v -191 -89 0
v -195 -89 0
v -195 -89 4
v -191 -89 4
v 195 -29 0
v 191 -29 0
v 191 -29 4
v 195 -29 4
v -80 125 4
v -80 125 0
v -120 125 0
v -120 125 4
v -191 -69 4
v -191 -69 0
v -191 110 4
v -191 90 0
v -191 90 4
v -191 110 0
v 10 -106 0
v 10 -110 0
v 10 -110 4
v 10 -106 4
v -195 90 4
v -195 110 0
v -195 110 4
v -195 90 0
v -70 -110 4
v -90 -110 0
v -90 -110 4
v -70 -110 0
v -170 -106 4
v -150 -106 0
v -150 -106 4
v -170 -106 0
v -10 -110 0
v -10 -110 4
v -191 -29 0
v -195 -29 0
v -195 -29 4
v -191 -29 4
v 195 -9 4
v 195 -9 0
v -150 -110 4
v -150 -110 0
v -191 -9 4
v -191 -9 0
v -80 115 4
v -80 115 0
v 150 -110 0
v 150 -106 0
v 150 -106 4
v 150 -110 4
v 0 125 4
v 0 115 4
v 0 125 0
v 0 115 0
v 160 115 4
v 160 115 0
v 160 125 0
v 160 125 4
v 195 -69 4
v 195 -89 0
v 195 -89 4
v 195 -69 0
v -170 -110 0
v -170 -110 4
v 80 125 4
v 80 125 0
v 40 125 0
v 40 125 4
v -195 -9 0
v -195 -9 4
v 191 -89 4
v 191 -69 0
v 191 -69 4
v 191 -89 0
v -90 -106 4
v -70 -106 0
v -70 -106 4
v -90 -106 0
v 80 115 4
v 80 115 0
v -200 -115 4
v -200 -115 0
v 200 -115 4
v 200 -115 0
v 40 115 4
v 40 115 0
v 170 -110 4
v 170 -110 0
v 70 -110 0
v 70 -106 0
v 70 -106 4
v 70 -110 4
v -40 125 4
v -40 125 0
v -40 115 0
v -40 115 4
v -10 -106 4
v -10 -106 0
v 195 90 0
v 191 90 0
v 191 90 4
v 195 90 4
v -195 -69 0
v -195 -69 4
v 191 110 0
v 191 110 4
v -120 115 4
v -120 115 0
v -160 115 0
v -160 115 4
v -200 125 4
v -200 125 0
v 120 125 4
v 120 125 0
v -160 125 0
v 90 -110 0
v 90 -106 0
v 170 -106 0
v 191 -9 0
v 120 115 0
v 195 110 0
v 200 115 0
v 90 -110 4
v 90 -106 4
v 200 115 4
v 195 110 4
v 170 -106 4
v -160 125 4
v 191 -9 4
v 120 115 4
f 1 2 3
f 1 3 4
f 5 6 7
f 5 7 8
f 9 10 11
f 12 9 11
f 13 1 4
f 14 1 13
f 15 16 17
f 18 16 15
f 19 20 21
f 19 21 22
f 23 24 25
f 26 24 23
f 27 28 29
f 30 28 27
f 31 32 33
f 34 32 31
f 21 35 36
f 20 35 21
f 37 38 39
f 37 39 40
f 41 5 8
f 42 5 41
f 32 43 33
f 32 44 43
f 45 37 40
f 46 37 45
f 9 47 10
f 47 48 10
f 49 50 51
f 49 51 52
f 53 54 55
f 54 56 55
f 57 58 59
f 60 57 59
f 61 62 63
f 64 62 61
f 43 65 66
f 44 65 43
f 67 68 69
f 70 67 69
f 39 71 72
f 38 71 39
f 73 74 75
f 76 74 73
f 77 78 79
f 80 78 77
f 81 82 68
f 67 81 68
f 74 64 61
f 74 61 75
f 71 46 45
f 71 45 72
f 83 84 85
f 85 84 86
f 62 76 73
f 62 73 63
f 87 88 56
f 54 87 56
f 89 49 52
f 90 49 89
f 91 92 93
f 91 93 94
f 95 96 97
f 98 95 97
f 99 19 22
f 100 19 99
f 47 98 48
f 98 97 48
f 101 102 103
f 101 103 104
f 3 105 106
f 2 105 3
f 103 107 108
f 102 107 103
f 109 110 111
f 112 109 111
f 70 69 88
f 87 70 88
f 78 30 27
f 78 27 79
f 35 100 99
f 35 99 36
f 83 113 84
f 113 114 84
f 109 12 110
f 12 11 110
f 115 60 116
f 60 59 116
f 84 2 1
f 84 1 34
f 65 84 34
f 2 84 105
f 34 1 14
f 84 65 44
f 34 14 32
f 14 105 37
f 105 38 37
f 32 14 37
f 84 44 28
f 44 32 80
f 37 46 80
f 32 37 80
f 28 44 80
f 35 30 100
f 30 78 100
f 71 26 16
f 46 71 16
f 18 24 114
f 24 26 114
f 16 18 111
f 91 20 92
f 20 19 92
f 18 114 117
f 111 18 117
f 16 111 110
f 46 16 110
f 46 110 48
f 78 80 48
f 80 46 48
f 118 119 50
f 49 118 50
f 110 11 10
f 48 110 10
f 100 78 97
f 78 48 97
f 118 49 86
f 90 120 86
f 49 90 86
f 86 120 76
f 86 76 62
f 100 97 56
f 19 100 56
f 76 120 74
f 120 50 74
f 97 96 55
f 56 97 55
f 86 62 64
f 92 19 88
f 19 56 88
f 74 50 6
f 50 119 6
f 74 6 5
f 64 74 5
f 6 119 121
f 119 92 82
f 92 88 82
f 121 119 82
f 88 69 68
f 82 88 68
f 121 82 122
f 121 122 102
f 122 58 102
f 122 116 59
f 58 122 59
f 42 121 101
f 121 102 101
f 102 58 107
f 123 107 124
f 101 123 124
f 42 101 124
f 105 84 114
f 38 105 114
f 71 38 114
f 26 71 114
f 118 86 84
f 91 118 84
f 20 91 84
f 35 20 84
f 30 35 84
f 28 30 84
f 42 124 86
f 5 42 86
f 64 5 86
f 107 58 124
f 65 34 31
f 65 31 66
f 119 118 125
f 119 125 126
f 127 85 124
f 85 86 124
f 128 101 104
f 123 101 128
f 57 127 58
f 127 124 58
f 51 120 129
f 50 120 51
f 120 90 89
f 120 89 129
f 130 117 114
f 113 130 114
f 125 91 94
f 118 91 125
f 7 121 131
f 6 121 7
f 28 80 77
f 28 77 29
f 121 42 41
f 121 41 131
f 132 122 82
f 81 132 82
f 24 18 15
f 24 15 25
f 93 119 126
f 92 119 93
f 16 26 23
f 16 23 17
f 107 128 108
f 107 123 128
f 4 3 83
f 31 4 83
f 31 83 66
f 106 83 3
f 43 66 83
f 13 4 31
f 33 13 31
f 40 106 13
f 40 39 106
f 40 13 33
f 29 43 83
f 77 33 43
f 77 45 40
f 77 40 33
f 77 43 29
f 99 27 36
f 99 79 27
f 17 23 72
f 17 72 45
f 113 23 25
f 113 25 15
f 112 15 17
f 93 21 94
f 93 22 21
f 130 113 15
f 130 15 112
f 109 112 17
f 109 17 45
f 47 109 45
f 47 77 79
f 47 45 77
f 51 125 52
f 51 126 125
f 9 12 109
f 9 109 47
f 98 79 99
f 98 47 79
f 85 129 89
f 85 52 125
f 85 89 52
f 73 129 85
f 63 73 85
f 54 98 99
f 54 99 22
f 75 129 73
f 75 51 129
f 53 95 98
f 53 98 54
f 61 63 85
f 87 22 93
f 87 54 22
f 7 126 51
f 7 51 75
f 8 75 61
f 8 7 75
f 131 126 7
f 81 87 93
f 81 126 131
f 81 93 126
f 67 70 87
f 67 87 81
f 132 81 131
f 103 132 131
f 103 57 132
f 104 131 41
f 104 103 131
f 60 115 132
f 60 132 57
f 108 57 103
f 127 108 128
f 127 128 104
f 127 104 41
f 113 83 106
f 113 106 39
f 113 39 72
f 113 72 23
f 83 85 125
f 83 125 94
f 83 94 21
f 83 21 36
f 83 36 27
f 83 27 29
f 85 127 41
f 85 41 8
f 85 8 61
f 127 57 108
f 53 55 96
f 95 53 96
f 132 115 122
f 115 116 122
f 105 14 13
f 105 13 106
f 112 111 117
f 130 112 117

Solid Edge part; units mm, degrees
sketch "Sketch1" plane through (0, 0, 0) normal (0, 0, 1) x (1, 0, 0)
  line L0 (-200, -115) -> (200, -115)
  line L1 (200, -115) -> (200, 115)
  line L2 (200, 115) -> (-200, 115)
  line L3 (-200, 115) -> (-200, -115)
  line L4 (-160, 115) -> (-160, 125)
  line L5 (-160, 125) -> (-200, 125)
  line L6 (-200, 125) -> (-200, 115)
  line L7 (-200, 115) -> (-160, 115)
  line L8 (-120, 115) -> (-80, 115)
  line L9 (-80, 115) -> (-80, 125)
  line L10 (-80, 125) -> (-120, 125)
  line L11 (-120, 125) -> (-120, 115)
  line L12 (-40, 115) -> (0, 115)
  line L13 (0, 115) -> (0, 125)
  line L14 (0, 125) -> (-40, 125)
  line L15 (-40, 125) -> (-40, 115)
  line L16 (40, 115) -> (80, 115)
  line L17 (80, 115) -> (80, 125)
  line L18 (80, 125) -> (40, 125)
  line L19 (40, 125) -> (40, 115)
  line L20 (120, 115) -> (160, 115)
  line L21 (160, 115) -> (160, 125)
  line L22 (160, 125) -> (120, 125)
  line L23 (120, 125) -> (120, 115)
  line L24 (-150, -106) -> (-170, -106)
  line L25 (-170, -106) -> (-170, -110)
  line L26 (-170, -110) -> (-150, -110)
  line L27 (-150, -110) -> (-150, -106)
  line L28 (-90, -110) -> (-70, -110)
  line L29 (-70, -110) -> (-70, -106)
  line L30 (-70, -106) -> (-90, -106)
  line L31 (-90, -106) -> (-90, -110)
  line L32 (-10, -110) -> (10, -110)
  line L33 (10, -110) -> (10, -106)
  line L34 (10, -106) -> (-10, -106)
  line L35 (-10, -106) -> (-10, -110)
  line L36 (70, -110) -> (90, -110)
  line L37 (90, -110) -> (90, -106)
  line L38 (90, -106) -> (70, -106)
  line L39 (70, -106) -> (70, -110)
  line L40 (150, -110) -> (170, -110)
  line L41 (170, -110) -> (170, -106)
  line L42 (170, -106) -> (150, -106)
  line L43 (150, -106) -> (150, -110)
  line L44 (-191, -89) -> (-191, -69)
  line L45 (-191, -69) -> (-195, -69)
  line L46 (-195, -69) -> (-195, -89)
  line L47 (-195, -89) -> (-191, -89)
  line L48 (-191, -29) -> (-191, -9)
  line L49 (-191, -9) -> (-195, -9)
  line L50 (-195, -9) -> (-195, -29)
  line L51 (-195, -29) -> (-191, -29)
  line L52 (-191, 90) -> (-191, 110)
  line L53 (-191, 110) -> (-195, 110)
  line L54 (-195, 110) -> (-195, 90)
  line L55 (-195, 90) -> (-191, 90)
  line L56 (191, -69) -> (191, -89)
  line L57 (191, -89) -> (195, -89)
  line L58 (195, -89) -> (195, -69)
  line L59 (195, -69) -> (191, -69)
  line L60 (195, -29) -> (195, -9)
  line L61 (195, -9) -> (191, -9)
  line L62 (191, -9) -> (191, -29)
  line L63 (191, -29) -> (195, -29)
  line L64 (191, 110) -> (191, 90)
  line L65 (191, 90) -> (195, 90)
  line L66 (195, 90) -> (195, 110)
  line L67 (195, 110) -> (191, 110)
  dimension "D1" = 20
  dimension "D2" = 20
  dimension "D3" = 20
  dimension "D4" = 4
  dimension "D5" = 4
  dimension "D6" = 20
  dimension "D7" = 20
  dimension "D8" = 4
  dimension "D9" = 4
  dimension "D10" = 4
  dimension "D11" = 30
  dimension "D12" = 60
  dimension "D13" = 60
  dimension "D14" = 30
  dimension "D15" = 60
  dimension "D16" = 60
  dimension "D17" = 5
  dimension "D18" = 5
  dimension "D19" = 5
  dimension "D20" = 5
  dimension "D21" = 5
  dimension "D22" = 40
  dimension "D23" = 10
  dimension "D24" = 40
  dimension "D25" = 40
  dimension "D26" = 10
  dimension "D27" = 40
  dimension "D28" = 40
  dimension "D29" = 10
  dimension "D30" = 40
  dimension "D31" = 40
  dimension "D32" = 10
  dimension "D33" = 40
  dimension "D34" = 40
  dimension "D35" = 10
  dimension "D36" = 40
  dimension "D37" = 230
  dimension "D38" = 20
  dimension "D39" = 4
  dimension "D40" = 5
  dimension "D41" = 20
  dimension "D42" = 99
  dimension "D43" = 5
  dimension "D44" = 4
  dimension "D45" = 20
  dimension "D46" = 4
  dimension "D47" = 40
  dimension "D48" = 5
  dimension "D49" = 20
  dimension "D50" = 5
  dimension "D51" = 4
  dimension "D52" = 99
  dimension "D53" = 20
  dimension "D54" = 4
  dimension "D55" = 5
  dimension "D56" = 5
  dimension "D57" = 20
  dimension "D58" = 4
  dimension "D59" = 40
  dimension "D60" = 5
  dimension "D61" = 5
extrude "Protrusion1" add sketch "Sketch1" along normal blind 4
